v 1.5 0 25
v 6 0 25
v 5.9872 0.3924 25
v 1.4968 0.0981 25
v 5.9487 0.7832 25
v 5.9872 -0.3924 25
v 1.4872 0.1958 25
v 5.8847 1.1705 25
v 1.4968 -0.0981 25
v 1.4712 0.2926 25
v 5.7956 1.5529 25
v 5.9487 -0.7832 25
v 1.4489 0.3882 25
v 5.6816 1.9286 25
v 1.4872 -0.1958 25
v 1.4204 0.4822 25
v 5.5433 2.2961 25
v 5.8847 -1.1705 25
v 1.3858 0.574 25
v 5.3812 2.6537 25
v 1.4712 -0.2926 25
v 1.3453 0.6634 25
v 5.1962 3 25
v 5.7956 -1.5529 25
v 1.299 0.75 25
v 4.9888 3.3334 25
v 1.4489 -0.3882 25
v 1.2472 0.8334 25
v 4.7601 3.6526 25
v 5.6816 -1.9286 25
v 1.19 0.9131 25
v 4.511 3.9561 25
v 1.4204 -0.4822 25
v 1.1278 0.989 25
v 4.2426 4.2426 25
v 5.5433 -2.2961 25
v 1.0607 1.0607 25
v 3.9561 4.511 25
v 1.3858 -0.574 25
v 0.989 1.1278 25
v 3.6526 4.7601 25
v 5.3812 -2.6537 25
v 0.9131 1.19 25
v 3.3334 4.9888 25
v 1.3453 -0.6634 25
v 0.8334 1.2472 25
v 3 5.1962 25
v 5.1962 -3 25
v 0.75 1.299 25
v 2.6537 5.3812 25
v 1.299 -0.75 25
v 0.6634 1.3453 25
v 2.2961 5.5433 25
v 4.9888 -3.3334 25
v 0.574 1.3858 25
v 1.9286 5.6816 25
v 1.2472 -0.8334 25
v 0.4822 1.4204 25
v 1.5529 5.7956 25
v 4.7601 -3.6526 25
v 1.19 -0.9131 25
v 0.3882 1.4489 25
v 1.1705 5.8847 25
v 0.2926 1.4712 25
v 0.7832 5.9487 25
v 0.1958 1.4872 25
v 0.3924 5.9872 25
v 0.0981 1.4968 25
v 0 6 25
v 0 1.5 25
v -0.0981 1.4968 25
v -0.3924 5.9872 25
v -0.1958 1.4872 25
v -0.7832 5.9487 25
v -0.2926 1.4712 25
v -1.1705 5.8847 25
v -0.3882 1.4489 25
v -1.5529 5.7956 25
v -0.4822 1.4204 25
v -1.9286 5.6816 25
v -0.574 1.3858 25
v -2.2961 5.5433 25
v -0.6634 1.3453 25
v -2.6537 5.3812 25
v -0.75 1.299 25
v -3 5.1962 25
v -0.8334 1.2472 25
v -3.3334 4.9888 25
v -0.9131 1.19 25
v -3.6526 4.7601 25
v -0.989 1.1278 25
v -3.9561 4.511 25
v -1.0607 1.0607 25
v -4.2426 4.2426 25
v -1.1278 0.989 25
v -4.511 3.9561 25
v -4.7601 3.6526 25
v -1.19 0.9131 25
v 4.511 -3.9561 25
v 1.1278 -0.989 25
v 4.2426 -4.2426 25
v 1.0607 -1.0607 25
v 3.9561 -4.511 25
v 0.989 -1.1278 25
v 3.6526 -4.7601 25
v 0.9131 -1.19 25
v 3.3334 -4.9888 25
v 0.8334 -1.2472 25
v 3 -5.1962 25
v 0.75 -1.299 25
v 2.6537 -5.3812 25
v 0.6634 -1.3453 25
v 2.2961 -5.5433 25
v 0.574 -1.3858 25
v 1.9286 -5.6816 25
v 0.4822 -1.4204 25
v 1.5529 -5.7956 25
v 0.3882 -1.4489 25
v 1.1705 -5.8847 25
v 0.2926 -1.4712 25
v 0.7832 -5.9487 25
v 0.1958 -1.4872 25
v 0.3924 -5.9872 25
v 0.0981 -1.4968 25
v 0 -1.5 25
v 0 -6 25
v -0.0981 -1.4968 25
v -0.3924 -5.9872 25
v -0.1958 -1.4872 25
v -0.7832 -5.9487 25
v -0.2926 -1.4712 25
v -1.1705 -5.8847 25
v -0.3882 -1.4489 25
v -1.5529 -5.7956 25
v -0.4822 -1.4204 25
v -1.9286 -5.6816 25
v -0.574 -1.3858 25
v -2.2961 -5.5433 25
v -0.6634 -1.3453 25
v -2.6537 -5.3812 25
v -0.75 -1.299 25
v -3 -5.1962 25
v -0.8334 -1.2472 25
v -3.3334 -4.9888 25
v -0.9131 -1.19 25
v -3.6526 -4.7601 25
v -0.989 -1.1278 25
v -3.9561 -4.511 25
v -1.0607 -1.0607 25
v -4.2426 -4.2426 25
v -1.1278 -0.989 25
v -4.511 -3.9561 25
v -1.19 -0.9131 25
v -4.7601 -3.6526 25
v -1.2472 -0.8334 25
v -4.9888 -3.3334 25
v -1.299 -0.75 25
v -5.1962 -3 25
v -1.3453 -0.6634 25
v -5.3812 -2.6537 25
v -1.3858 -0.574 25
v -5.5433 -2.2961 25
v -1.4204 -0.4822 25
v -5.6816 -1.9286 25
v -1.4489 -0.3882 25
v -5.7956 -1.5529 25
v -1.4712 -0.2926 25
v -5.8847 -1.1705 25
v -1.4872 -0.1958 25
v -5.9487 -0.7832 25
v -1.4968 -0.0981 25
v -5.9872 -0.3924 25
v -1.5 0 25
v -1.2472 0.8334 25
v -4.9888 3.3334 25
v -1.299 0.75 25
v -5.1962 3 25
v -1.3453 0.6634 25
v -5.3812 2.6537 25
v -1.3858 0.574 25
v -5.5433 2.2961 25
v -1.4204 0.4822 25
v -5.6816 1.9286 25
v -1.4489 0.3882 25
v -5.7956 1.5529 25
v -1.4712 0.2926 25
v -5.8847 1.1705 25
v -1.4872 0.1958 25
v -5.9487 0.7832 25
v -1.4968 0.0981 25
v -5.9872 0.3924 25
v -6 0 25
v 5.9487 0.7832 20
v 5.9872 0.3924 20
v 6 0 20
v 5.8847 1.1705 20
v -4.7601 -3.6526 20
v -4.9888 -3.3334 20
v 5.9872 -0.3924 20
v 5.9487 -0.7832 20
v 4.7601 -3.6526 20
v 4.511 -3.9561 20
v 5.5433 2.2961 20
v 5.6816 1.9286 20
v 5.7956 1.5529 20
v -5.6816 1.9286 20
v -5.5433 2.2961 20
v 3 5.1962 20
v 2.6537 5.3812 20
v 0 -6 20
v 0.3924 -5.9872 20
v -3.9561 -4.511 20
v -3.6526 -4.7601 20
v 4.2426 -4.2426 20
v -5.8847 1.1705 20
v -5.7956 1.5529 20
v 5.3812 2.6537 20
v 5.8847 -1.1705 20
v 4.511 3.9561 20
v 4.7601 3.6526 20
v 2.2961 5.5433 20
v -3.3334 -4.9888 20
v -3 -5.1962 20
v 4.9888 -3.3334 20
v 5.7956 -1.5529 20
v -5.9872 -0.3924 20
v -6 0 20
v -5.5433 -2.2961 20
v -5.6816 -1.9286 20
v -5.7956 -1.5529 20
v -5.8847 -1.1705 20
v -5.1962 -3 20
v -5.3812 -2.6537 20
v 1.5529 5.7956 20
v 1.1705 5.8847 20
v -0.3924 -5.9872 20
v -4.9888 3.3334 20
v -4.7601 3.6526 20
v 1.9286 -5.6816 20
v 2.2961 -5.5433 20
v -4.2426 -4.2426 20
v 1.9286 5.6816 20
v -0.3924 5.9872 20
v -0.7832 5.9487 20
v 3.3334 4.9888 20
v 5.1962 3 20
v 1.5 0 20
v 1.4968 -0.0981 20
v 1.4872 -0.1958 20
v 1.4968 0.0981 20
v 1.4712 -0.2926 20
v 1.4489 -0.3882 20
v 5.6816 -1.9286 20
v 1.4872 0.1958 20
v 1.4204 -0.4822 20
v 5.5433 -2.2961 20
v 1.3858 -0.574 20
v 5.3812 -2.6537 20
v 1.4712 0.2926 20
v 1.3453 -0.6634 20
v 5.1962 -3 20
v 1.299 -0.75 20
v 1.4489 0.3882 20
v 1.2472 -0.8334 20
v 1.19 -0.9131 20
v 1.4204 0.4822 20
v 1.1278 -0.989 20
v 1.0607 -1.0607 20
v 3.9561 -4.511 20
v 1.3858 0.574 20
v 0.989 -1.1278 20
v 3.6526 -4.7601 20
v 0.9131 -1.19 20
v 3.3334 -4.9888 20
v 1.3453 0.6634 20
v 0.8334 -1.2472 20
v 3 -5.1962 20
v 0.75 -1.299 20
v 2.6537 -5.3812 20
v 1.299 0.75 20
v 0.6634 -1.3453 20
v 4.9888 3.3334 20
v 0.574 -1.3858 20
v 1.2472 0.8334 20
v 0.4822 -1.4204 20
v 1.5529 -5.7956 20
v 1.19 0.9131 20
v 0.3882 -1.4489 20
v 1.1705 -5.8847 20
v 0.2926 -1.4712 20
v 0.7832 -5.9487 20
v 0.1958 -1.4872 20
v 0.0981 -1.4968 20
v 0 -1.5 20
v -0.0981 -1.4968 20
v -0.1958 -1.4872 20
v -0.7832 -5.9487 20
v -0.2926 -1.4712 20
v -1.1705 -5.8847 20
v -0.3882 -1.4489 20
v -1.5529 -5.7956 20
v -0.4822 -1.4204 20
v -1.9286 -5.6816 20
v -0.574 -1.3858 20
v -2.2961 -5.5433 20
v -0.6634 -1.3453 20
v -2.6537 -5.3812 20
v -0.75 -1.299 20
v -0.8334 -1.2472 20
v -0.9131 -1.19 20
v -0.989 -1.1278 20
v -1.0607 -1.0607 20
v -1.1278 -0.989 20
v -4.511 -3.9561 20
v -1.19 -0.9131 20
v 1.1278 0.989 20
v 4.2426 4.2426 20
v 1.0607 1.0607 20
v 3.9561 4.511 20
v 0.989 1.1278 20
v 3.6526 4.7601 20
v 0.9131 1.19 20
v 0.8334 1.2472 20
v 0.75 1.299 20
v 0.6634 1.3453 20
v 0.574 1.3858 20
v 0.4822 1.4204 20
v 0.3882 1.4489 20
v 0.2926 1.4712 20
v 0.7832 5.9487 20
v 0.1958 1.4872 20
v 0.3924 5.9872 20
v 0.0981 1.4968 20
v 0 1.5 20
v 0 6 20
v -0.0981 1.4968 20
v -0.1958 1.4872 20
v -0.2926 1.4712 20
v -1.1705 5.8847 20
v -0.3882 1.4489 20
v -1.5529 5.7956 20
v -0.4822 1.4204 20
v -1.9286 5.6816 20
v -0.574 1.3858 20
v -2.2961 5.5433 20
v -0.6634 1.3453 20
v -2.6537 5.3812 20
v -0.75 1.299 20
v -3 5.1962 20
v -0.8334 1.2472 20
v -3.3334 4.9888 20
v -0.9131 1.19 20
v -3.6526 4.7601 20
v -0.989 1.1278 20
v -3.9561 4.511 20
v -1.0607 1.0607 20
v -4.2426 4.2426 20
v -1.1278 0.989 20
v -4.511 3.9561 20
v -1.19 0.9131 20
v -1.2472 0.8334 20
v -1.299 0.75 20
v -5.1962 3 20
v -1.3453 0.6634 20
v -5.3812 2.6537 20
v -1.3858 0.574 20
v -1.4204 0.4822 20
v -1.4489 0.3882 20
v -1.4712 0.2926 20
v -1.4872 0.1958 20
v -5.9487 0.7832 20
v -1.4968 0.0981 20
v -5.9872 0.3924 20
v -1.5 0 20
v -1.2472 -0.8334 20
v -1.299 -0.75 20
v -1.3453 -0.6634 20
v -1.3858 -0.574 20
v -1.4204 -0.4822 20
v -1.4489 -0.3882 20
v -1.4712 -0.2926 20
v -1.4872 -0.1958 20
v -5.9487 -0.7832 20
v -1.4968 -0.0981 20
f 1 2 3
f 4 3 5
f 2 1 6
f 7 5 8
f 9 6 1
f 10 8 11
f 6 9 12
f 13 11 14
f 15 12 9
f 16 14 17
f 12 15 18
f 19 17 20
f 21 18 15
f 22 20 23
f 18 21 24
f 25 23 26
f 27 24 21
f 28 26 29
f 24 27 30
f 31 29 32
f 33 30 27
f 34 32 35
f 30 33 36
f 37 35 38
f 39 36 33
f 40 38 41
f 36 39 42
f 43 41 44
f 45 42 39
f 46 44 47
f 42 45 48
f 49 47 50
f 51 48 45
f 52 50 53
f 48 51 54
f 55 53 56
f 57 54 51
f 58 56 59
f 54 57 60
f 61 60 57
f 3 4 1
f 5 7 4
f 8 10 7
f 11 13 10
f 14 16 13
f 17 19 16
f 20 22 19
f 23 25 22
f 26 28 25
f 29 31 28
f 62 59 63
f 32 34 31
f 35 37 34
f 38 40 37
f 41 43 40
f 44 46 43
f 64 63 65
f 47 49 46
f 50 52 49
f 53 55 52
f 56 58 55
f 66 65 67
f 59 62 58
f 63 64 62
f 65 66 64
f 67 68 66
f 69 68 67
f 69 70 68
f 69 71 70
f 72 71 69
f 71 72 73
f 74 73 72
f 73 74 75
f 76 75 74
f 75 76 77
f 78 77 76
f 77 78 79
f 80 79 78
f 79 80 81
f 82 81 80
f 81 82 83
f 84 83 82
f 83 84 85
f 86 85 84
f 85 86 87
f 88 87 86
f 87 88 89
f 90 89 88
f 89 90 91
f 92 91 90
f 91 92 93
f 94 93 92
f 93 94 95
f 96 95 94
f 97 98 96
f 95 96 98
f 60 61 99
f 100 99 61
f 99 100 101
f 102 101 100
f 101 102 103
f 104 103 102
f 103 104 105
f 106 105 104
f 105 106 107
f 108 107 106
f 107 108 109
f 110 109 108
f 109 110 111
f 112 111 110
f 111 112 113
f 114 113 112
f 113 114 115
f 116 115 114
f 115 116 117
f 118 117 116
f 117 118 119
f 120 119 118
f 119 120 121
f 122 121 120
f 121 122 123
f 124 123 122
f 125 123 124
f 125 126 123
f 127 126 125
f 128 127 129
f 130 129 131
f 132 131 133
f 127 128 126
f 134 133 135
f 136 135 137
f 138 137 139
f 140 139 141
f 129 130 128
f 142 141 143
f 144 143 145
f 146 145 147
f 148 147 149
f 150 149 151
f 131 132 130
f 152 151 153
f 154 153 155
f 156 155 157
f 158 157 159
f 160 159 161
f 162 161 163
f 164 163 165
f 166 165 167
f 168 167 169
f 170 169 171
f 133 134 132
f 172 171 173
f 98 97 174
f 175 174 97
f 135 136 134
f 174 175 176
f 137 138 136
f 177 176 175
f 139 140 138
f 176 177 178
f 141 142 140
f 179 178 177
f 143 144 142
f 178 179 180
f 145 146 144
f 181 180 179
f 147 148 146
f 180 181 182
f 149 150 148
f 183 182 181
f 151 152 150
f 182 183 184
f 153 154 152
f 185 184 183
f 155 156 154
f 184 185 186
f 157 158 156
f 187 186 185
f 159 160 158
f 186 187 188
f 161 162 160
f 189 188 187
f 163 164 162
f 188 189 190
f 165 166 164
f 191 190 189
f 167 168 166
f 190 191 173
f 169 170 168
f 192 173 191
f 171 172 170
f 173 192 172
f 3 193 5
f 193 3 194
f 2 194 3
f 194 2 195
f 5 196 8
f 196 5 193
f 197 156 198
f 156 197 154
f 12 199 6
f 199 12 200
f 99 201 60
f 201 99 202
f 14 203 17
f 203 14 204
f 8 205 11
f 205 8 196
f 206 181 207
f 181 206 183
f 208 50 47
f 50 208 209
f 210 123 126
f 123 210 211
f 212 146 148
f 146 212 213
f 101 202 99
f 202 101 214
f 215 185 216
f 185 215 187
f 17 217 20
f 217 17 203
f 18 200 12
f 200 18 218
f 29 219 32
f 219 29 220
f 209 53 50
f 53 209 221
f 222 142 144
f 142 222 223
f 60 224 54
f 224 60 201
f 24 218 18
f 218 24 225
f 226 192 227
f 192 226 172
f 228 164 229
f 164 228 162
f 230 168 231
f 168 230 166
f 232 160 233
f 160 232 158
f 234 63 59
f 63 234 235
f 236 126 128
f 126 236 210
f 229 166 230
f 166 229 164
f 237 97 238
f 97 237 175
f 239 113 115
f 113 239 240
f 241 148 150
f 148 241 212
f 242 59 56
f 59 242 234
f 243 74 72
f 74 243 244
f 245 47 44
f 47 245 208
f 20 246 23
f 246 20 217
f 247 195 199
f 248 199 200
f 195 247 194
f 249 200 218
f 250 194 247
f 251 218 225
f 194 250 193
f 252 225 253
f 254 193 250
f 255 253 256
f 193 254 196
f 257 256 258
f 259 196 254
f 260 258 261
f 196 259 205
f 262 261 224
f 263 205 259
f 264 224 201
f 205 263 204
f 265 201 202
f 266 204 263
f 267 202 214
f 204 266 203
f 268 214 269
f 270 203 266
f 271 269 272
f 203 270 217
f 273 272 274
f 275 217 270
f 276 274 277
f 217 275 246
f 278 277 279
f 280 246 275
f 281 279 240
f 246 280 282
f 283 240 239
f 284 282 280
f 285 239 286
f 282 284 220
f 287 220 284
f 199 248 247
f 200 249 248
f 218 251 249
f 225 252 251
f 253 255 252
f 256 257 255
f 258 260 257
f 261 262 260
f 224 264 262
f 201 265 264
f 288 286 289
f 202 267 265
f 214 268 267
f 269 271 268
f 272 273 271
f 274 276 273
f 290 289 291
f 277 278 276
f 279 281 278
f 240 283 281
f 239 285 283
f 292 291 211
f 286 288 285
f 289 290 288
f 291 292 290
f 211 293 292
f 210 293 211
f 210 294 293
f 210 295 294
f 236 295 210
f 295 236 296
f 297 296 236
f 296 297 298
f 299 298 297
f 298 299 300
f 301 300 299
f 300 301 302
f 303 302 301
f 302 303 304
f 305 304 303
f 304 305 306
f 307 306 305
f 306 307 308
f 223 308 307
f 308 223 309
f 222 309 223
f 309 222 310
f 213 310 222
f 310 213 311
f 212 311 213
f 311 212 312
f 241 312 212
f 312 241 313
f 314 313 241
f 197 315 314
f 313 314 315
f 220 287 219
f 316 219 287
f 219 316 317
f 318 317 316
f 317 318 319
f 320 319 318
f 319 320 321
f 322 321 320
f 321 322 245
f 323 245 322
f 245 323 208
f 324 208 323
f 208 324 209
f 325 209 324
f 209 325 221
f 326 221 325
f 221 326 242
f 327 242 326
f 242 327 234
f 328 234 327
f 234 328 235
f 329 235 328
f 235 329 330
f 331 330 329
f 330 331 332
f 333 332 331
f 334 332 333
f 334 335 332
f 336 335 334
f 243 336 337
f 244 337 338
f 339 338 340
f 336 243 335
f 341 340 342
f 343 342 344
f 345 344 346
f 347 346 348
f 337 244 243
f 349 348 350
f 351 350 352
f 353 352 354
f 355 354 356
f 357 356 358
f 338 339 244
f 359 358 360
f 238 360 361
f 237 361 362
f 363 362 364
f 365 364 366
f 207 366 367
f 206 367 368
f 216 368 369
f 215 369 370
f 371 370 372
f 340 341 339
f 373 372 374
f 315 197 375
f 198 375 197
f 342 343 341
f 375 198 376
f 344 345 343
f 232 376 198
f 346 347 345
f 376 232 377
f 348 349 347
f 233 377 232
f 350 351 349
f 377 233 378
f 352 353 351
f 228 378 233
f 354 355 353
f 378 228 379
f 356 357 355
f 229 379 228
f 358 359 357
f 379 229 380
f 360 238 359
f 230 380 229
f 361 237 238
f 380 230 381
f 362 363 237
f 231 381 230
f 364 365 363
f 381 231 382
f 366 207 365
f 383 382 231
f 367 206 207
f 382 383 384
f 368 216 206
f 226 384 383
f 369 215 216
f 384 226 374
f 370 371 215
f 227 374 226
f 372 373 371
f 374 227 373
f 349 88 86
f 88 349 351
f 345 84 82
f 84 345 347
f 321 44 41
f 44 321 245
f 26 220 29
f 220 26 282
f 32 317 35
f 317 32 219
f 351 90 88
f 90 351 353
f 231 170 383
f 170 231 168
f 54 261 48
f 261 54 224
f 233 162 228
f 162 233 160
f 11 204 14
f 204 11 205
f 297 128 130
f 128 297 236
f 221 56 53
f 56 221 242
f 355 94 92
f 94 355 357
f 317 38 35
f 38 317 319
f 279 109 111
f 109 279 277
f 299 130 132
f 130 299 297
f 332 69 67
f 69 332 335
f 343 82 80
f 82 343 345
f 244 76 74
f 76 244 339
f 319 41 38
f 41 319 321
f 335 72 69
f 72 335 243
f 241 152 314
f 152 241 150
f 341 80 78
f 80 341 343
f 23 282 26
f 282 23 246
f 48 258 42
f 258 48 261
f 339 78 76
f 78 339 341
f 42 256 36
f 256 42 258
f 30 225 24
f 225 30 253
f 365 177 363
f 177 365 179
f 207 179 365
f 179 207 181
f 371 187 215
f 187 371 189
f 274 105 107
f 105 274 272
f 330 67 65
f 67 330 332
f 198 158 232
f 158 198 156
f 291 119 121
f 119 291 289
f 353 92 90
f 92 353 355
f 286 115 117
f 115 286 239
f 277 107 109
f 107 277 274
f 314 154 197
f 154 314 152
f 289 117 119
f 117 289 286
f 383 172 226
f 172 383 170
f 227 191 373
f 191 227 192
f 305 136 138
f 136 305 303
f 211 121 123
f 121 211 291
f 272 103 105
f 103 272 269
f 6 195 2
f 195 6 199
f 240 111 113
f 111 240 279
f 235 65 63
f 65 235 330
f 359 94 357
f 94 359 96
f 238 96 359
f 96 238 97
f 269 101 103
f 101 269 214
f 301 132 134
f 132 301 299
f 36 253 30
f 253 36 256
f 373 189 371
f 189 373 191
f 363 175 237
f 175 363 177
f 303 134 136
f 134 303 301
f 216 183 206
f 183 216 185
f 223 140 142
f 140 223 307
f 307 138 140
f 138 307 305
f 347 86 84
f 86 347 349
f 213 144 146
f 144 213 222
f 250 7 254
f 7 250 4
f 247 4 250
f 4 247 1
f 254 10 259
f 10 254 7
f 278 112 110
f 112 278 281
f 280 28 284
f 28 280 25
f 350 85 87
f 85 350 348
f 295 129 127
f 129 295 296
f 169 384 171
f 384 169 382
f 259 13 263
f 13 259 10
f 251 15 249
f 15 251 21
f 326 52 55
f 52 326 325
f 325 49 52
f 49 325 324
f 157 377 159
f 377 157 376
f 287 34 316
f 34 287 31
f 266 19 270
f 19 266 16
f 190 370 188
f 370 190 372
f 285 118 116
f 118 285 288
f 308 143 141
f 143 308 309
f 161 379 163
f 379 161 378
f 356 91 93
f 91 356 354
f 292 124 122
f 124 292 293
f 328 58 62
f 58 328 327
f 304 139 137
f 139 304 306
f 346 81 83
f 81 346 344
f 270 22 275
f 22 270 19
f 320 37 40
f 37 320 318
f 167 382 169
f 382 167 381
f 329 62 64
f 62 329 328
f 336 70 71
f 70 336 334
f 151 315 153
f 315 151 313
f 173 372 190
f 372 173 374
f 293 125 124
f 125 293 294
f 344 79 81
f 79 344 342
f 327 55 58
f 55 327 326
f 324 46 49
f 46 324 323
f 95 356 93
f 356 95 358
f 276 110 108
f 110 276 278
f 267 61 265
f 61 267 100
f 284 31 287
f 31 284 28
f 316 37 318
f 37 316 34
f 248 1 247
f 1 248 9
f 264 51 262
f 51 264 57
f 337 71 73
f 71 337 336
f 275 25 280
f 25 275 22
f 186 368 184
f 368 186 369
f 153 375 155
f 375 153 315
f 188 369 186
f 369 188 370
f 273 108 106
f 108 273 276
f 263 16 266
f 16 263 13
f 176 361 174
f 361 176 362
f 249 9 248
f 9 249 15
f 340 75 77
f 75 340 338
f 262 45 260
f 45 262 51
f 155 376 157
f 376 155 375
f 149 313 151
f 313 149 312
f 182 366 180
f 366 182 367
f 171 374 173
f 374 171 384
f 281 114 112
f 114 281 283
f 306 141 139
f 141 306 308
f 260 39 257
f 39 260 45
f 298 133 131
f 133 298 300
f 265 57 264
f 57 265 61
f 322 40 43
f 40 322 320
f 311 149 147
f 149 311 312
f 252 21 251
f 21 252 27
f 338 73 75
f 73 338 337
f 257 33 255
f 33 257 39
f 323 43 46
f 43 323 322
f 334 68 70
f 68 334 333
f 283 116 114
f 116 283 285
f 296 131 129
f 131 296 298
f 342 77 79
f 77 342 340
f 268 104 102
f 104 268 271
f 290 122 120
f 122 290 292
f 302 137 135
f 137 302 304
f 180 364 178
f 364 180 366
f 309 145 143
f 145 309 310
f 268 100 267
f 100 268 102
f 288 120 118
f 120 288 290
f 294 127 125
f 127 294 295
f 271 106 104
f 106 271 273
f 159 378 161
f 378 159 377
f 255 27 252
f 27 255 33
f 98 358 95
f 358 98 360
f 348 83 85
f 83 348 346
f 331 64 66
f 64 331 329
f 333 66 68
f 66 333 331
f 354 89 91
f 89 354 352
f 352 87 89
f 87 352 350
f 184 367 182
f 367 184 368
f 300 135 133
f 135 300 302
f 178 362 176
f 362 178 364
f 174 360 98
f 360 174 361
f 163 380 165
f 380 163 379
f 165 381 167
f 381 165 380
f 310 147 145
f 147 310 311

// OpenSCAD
// Hose-barb reducer: joins 8 mm inner-diameter silicone tubing to 5 mm inner-diameter tubing
// Print orientation: standing upright along +Z, centred on origin in X/Y
// Units: mm

$fn = 96;

// ---- Bore ----
bore = 3;

// ---- 8 mm tubing side (z = 0 to 20) ----
z0      = 0;
z_barb1 = 20;
barb_h  = 10;
barb_d0 = 7.5;   // outer diameter at bottom of each barb
barb_d1 = 9.5;   // outer diameter at top of each barb

// ---- 5 mm tubing side (z = 25 to 41) ----
z_barb2 = 25;
z_top   = 41;
barb_h2 = 8;
barb_d2 = 6.5;   // outer diameter at bottom of each barb
barb_d3 = 5.0;   // outer diameter at top of each barb

// ---- Collar (z = 20 to 25) ----
z_collar0 = 20;
z_collar1 = 25;
collar_d  = 12;

// ---- Stacking clearance ----
eps = 0.5;

// Derived
n_barb = 2;
d_f1 = (barb_d0 + barb_d1) / 2;
d_f2 = (barb_d2 + barb_d3) / 2;

difference() {
    union() {
        // 8 mm tubing barbs
        for (i = [0 : n_barb - 1])
            translate([0, 0, z0 + i * (barb_h + eps)])
                linear_extrude(height = barb_h)
                    circle(d = [barb_d0, barb_d1]);

        // 5 mm tubing barbs
        for (i = [0 : n_barb - 1])
            translate([0, 0, z_barb2 + i * (barb_h2 + eps)])
                linear_extrude(height = barb_h2)
                    circle(d = [barb_d2, barb_d3]);

        // Collar
        translate([0, 0, z_collar0])
            cylinder(d = collar_d, h = z_collar1 - z_collar0);
    }

    // Through bore
    translate([0, 0, -1])
        cylinder(d = bore, h = z_top + 2);
}
